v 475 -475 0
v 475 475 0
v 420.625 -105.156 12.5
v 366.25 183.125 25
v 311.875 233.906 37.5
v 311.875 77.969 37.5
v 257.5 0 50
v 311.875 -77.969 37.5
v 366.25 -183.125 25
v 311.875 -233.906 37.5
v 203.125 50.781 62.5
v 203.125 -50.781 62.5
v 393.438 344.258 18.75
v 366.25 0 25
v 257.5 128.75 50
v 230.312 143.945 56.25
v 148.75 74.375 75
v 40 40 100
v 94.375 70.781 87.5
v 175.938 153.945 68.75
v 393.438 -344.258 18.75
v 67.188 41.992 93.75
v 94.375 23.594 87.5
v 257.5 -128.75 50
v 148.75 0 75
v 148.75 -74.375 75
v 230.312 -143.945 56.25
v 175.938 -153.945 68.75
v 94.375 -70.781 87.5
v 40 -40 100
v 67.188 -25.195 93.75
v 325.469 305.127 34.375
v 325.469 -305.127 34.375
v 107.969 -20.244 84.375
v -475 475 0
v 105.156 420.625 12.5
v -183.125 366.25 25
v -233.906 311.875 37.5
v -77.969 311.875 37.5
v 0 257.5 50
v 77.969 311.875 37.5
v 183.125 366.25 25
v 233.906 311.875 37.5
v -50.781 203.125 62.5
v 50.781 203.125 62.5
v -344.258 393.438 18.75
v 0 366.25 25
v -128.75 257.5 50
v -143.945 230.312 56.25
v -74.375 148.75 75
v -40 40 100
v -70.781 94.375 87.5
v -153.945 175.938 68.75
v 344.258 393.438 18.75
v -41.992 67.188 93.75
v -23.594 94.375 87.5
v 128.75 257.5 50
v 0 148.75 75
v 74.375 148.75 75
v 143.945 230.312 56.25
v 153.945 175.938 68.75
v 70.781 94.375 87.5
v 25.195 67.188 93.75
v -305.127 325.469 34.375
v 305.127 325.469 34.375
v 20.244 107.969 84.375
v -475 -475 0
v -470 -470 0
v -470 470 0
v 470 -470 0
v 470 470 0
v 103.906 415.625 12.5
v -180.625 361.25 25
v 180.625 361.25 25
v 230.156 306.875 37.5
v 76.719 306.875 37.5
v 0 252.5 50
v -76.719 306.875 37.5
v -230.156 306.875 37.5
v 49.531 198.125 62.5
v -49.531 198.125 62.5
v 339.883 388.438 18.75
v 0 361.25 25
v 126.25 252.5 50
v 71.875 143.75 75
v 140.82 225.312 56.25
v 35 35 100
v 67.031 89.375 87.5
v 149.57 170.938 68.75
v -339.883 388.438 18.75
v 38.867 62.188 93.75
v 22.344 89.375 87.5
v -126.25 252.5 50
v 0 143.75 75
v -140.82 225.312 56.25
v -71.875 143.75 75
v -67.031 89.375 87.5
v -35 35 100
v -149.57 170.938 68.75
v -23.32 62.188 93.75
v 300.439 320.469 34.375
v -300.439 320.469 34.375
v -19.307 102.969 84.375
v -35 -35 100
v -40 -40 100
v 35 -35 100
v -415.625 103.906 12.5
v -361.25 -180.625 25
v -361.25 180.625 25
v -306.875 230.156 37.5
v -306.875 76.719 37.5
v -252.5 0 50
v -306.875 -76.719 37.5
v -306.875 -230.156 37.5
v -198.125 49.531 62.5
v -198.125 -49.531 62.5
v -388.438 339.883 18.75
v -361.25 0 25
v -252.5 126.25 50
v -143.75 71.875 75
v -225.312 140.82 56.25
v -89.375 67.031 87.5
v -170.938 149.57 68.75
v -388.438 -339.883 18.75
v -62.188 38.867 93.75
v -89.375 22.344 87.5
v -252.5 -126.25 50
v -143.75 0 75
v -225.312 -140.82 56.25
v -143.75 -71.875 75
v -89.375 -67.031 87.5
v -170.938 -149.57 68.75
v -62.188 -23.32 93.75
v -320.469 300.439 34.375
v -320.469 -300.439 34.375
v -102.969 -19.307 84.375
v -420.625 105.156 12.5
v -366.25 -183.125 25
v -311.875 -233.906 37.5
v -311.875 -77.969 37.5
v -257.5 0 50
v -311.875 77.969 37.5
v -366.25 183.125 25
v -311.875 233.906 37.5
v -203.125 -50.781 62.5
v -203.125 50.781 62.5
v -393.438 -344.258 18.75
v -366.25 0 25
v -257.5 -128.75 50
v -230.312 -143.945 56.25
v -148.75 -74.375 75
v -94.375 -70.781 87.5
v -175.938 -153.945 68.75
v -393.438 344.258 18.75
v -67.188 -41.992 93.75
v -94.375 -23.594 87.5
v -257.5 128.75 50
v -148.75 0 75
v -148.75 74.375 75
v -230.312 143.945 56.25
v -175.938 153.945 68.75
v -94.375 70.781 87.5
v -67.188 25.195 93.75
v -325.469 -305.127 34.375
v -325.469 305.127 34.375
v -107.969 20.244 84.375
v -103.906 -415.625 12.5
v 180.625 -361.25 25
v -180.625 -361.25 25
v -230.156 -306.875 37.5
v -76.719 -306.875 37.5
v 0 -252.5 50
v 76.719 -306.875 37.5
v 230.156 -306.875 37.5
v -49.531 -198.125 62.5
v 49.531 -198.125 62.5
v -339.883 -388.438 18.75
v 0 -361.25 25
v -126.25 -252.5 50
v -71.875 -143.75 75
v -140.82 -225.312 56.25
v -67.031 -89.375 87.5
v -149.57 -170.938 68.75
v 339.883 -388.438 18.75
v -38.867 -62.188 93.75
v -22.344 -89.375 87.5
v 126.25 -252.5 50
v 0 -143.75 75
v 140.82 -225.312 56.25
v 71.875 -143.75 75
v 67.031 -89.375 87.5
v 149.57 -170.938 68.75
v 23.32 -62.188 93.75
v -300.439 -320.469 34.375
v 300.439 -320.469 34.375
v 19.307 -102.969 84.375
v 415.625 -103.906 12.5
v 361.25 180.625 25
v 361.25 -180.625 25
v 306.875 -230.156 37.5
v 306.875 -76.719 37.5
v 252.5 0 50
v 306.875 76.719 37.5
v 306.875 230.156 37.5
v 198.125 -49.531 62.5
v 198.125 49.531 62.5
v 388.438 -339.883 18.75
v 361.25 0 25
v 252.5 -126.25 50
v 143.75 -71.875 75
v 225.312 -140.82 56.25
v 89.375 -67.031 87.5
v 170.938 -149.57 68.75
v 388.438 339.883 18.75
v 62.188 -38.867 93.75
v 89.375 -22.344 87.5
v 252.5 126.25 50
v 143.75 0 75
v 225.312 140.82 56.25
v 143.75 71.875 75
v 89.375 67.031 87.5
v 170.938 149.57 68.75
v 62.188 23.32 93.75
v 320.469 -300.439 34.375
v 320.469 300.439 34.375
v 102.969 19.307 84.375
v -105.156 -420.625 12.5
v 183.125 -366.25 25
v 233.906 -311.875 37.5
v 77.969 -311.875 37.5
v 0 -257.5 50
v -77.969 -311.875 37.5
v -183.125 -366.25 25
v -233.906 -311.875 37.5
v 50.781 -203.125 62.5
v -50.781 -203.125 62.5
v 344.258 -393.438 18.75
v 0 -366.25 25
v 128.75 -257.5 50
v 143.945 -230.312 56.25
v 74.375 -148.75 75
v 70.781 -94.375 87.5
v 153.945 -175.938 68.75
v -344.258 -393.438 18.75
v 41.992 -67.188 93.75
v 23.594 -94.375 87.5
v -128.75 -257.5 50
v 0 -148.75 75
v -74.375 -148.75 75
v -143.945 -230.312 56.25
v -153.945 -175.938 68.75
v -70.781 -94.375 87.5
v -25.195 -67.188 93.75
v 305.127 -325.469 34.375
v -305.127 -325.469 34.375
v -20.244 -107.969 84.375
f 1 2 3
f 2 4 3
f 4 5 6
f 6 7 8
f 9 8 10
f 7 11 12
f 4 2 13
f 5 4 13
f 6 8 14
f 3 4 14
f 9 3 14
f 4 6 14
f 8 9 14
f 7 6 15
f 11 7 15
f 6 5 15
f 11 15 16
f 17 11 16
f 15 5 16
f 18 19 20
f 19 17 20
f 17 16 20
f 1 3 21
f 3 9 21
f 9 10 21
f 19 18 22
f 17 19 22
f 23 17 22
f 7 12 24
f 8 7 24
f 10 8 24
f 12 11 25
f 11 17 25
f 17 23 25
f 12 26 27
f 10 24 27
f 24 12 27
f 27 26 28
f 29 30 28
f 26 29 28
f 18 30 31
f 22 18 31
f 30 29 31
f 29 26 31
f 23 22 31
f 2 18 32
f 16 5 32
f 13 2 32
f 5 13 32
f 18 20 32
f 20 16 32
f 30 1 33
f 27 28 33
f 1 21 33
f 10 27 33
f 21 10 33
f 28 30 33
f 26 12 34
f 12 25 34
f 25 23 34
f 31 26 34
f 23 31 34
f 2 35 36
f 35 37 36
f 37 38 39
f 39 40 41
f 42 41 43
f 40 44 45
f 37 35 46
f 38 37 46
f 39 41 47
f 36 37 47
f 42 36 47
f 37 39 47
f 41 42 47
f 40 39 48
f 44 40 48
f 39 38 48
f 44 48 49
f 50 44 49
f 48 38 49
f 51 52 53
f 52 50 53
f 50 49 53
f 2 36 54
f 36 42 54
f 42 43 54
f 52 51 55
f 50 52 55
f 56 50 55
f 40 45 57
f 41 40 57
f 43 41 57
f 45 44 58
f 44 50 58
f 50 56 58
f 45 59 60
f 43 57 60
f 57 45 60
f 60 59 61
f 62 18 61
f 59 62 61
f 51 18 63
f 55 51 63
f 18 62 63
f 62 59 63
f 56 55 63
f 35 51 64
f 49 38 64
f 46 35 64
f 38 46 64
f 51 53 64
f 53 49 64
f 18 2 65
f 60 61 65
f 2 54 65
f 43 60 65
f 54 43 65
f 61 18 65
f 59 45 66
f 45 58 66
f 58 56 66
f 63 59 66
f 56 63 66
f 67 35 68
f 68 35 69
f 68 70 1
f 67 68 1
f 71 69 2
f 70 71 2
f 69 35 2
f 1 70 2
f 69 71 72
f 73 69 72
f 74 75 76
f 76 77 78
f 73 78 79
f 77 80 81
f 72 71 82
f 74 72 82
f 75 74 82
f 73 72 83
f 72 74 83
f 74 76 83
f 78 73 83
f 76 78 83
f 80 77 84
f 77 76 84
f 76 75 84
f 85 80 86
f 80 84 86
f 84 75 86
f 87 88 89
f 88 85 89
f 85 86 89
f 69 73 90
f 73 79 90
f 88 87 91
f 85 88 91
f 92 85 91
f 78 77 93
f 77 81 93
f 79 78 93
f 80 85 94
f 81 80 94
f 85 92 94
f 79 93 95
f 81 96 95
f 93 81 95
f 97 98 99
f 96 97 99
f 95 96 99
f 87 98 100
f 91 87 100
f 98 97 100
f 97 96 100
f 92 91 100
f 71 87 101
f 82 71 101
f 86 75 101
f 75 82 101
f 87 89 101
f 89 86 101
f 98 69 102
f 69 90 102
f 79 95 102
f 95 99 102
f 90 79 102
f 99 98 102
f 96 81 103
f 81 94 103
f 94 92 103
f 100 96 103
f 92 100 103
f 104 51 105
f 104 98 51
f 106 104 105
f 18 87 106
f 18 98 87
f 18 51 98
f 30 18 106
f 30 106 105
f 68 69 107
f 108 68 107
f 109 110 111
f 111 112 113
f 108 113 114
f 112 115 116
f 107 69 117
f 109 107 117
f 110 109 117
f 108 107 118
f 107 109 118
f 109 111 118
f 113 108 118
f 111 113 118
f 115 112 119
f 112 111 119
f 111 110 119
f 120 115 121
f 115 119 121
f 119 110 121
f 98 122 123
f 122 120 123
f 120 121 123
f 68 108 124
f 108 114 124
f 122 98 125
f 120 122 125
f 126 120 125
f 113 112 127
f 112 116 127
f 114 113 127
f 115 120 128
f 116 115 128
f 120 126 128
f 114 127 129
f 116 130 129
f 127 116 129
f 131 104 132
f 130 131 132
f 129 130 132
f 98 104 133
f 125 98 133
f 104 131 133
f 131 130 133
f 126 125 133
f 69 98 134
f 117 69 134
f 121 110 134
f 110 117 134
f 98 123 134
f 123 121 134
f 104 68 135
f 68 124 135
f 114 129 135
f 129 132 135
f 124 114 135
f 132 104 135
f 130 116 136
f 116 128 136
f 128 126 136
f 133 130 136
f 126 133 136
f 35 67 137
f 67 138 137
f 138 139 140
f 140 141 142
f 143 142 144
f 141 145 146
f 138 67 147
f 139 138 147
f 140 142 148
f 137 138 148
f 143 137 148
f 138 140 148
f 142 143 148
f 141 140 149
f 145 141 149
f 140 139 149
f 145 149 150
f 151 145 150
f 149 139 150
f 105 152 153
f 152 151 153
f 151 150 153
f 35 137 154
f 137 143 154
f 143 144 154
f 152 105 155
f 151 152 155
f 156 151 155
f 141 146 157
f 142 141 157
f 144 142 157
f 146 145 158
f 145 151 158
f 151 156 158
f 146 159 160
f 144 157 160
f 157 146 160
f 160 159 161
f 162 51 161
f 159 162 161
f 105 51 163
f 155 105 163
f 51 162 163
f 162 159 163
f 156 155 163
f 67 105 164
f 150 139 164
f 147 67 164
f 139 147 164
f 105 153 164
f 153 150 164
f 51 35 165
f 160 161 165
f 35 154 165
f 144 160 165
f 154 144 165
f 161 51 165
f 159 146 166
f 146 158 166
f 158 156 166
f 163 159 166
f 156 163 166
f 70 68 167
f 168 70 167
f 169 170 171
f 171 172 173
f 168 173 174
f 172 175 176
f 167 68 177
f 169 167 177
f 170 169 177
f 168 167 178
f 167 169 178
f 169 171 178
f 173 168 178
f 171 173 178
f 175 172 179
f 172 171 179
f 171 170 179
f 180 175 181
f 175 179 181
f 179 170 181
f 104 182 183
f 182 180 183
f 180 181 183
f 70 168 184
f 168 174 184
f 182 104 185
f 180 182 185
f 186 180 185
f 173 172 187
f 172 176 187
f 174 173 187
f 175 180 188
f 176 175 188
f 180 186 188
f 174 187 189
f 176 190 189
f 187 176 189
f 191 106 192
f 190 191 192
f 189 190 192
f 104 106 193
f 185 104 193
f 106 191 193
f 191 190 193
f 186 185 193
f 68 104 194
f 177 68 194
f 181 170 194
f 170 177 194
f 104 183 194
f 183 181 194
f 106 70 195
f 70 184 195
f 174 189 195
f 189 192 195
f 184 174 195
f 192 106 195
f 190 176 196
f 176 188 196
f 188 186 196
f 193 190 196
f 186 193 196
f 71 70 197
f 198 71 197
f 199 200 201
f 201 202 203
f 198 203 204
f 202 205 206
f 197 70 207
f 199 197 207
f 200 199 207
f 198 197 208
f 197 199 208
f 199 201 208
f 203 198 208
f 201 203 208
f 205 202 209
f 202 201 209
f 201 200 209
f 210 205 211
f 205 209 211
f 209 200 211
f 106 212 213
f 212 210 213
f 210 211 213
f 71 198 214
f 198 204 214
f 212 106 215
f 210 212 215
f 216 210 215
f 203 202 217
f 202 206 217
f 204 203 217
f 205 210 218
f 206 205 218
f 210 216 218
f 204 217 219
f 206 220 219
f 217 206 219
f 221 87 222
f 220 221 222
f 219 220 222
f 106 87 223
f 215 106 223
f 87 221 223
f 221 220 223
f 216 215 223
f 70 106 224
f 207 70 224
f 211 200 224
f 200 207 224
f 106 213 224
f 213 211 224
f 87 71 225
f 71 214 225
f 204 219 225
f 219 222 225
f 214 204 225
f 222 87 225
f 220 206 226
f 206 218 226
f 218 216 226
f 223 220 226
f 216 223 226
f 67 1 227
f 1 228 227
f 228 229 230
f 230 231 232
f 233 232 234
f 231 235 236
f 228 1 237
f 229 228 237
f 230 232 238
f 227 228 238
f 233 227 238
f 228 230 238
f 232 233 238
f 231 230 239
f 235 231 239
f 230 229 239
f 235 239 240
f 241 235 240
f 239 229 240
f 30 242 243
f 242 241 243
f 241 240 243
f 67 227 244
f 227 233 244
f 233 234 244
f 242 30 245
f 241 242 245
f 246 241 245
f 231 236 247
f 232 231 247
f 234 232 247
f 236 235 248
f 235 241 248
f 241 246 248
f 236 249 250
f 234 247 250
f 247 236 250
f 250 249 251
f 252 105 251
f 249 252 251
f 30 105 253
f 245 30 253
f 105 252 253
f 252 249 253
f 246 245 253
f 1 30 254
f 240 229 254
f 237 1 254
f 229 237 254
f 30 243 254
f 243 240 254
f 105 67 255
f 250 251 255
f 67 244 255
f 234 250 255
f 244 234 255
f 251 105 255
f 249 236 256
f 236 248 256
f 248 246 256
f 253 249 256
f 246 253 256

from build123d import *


with BuildPart() as part:
    # 草图1 → Loft 1 section 0
    with BuildSketch(Plane.XY):
        with BuildLine():
            Line((-475, 475), (475, 475))
            Line((475, 475), (475, -475))
            Line((475, -475), (-475, -475))
            Line((-475, -475), (-475, 475))
        make_face()
    # 草图2 → Loft 1 section 1
    with BuildSketch(Plane.XY.offset(100)):
        with BuildLine():
            Line((-40, 40), (40, 40))
            Line((40, 40), (40, -40))
            Line((40, -40), (-40, -40))
            Line((-40, -40), (-40, 40))
        make_face()
    loft()

    # 草图3 → Loft 1 2 section 0
    with BuildSketch(Plane(origin=(0, 0, 0), x_dir=(-1, 0, 0), z_dir=(0, 0, -1))):
        with BuildLine():
            Line((470, -470), (-470, -470))
            Line((-470, -470), (-470, 470))
            Line((-470, 470), (470, 470))
            Line((470, 470), (470, -470))
        make_face()
    # 草图4 → Loft 1 2 section 1
    with BuildSketch(Plane.XY.offset(100)):
        with BuildLine():
            Line((-35, 35), (35, 35))
            Line((35, 35), (35, -35))
            Line((35, -35), (-35, -35))
            Line((-35, -35), (-35, 35))
        make_face()
    loft(mode=Mode.SUBTRACT)


solid = part.part
